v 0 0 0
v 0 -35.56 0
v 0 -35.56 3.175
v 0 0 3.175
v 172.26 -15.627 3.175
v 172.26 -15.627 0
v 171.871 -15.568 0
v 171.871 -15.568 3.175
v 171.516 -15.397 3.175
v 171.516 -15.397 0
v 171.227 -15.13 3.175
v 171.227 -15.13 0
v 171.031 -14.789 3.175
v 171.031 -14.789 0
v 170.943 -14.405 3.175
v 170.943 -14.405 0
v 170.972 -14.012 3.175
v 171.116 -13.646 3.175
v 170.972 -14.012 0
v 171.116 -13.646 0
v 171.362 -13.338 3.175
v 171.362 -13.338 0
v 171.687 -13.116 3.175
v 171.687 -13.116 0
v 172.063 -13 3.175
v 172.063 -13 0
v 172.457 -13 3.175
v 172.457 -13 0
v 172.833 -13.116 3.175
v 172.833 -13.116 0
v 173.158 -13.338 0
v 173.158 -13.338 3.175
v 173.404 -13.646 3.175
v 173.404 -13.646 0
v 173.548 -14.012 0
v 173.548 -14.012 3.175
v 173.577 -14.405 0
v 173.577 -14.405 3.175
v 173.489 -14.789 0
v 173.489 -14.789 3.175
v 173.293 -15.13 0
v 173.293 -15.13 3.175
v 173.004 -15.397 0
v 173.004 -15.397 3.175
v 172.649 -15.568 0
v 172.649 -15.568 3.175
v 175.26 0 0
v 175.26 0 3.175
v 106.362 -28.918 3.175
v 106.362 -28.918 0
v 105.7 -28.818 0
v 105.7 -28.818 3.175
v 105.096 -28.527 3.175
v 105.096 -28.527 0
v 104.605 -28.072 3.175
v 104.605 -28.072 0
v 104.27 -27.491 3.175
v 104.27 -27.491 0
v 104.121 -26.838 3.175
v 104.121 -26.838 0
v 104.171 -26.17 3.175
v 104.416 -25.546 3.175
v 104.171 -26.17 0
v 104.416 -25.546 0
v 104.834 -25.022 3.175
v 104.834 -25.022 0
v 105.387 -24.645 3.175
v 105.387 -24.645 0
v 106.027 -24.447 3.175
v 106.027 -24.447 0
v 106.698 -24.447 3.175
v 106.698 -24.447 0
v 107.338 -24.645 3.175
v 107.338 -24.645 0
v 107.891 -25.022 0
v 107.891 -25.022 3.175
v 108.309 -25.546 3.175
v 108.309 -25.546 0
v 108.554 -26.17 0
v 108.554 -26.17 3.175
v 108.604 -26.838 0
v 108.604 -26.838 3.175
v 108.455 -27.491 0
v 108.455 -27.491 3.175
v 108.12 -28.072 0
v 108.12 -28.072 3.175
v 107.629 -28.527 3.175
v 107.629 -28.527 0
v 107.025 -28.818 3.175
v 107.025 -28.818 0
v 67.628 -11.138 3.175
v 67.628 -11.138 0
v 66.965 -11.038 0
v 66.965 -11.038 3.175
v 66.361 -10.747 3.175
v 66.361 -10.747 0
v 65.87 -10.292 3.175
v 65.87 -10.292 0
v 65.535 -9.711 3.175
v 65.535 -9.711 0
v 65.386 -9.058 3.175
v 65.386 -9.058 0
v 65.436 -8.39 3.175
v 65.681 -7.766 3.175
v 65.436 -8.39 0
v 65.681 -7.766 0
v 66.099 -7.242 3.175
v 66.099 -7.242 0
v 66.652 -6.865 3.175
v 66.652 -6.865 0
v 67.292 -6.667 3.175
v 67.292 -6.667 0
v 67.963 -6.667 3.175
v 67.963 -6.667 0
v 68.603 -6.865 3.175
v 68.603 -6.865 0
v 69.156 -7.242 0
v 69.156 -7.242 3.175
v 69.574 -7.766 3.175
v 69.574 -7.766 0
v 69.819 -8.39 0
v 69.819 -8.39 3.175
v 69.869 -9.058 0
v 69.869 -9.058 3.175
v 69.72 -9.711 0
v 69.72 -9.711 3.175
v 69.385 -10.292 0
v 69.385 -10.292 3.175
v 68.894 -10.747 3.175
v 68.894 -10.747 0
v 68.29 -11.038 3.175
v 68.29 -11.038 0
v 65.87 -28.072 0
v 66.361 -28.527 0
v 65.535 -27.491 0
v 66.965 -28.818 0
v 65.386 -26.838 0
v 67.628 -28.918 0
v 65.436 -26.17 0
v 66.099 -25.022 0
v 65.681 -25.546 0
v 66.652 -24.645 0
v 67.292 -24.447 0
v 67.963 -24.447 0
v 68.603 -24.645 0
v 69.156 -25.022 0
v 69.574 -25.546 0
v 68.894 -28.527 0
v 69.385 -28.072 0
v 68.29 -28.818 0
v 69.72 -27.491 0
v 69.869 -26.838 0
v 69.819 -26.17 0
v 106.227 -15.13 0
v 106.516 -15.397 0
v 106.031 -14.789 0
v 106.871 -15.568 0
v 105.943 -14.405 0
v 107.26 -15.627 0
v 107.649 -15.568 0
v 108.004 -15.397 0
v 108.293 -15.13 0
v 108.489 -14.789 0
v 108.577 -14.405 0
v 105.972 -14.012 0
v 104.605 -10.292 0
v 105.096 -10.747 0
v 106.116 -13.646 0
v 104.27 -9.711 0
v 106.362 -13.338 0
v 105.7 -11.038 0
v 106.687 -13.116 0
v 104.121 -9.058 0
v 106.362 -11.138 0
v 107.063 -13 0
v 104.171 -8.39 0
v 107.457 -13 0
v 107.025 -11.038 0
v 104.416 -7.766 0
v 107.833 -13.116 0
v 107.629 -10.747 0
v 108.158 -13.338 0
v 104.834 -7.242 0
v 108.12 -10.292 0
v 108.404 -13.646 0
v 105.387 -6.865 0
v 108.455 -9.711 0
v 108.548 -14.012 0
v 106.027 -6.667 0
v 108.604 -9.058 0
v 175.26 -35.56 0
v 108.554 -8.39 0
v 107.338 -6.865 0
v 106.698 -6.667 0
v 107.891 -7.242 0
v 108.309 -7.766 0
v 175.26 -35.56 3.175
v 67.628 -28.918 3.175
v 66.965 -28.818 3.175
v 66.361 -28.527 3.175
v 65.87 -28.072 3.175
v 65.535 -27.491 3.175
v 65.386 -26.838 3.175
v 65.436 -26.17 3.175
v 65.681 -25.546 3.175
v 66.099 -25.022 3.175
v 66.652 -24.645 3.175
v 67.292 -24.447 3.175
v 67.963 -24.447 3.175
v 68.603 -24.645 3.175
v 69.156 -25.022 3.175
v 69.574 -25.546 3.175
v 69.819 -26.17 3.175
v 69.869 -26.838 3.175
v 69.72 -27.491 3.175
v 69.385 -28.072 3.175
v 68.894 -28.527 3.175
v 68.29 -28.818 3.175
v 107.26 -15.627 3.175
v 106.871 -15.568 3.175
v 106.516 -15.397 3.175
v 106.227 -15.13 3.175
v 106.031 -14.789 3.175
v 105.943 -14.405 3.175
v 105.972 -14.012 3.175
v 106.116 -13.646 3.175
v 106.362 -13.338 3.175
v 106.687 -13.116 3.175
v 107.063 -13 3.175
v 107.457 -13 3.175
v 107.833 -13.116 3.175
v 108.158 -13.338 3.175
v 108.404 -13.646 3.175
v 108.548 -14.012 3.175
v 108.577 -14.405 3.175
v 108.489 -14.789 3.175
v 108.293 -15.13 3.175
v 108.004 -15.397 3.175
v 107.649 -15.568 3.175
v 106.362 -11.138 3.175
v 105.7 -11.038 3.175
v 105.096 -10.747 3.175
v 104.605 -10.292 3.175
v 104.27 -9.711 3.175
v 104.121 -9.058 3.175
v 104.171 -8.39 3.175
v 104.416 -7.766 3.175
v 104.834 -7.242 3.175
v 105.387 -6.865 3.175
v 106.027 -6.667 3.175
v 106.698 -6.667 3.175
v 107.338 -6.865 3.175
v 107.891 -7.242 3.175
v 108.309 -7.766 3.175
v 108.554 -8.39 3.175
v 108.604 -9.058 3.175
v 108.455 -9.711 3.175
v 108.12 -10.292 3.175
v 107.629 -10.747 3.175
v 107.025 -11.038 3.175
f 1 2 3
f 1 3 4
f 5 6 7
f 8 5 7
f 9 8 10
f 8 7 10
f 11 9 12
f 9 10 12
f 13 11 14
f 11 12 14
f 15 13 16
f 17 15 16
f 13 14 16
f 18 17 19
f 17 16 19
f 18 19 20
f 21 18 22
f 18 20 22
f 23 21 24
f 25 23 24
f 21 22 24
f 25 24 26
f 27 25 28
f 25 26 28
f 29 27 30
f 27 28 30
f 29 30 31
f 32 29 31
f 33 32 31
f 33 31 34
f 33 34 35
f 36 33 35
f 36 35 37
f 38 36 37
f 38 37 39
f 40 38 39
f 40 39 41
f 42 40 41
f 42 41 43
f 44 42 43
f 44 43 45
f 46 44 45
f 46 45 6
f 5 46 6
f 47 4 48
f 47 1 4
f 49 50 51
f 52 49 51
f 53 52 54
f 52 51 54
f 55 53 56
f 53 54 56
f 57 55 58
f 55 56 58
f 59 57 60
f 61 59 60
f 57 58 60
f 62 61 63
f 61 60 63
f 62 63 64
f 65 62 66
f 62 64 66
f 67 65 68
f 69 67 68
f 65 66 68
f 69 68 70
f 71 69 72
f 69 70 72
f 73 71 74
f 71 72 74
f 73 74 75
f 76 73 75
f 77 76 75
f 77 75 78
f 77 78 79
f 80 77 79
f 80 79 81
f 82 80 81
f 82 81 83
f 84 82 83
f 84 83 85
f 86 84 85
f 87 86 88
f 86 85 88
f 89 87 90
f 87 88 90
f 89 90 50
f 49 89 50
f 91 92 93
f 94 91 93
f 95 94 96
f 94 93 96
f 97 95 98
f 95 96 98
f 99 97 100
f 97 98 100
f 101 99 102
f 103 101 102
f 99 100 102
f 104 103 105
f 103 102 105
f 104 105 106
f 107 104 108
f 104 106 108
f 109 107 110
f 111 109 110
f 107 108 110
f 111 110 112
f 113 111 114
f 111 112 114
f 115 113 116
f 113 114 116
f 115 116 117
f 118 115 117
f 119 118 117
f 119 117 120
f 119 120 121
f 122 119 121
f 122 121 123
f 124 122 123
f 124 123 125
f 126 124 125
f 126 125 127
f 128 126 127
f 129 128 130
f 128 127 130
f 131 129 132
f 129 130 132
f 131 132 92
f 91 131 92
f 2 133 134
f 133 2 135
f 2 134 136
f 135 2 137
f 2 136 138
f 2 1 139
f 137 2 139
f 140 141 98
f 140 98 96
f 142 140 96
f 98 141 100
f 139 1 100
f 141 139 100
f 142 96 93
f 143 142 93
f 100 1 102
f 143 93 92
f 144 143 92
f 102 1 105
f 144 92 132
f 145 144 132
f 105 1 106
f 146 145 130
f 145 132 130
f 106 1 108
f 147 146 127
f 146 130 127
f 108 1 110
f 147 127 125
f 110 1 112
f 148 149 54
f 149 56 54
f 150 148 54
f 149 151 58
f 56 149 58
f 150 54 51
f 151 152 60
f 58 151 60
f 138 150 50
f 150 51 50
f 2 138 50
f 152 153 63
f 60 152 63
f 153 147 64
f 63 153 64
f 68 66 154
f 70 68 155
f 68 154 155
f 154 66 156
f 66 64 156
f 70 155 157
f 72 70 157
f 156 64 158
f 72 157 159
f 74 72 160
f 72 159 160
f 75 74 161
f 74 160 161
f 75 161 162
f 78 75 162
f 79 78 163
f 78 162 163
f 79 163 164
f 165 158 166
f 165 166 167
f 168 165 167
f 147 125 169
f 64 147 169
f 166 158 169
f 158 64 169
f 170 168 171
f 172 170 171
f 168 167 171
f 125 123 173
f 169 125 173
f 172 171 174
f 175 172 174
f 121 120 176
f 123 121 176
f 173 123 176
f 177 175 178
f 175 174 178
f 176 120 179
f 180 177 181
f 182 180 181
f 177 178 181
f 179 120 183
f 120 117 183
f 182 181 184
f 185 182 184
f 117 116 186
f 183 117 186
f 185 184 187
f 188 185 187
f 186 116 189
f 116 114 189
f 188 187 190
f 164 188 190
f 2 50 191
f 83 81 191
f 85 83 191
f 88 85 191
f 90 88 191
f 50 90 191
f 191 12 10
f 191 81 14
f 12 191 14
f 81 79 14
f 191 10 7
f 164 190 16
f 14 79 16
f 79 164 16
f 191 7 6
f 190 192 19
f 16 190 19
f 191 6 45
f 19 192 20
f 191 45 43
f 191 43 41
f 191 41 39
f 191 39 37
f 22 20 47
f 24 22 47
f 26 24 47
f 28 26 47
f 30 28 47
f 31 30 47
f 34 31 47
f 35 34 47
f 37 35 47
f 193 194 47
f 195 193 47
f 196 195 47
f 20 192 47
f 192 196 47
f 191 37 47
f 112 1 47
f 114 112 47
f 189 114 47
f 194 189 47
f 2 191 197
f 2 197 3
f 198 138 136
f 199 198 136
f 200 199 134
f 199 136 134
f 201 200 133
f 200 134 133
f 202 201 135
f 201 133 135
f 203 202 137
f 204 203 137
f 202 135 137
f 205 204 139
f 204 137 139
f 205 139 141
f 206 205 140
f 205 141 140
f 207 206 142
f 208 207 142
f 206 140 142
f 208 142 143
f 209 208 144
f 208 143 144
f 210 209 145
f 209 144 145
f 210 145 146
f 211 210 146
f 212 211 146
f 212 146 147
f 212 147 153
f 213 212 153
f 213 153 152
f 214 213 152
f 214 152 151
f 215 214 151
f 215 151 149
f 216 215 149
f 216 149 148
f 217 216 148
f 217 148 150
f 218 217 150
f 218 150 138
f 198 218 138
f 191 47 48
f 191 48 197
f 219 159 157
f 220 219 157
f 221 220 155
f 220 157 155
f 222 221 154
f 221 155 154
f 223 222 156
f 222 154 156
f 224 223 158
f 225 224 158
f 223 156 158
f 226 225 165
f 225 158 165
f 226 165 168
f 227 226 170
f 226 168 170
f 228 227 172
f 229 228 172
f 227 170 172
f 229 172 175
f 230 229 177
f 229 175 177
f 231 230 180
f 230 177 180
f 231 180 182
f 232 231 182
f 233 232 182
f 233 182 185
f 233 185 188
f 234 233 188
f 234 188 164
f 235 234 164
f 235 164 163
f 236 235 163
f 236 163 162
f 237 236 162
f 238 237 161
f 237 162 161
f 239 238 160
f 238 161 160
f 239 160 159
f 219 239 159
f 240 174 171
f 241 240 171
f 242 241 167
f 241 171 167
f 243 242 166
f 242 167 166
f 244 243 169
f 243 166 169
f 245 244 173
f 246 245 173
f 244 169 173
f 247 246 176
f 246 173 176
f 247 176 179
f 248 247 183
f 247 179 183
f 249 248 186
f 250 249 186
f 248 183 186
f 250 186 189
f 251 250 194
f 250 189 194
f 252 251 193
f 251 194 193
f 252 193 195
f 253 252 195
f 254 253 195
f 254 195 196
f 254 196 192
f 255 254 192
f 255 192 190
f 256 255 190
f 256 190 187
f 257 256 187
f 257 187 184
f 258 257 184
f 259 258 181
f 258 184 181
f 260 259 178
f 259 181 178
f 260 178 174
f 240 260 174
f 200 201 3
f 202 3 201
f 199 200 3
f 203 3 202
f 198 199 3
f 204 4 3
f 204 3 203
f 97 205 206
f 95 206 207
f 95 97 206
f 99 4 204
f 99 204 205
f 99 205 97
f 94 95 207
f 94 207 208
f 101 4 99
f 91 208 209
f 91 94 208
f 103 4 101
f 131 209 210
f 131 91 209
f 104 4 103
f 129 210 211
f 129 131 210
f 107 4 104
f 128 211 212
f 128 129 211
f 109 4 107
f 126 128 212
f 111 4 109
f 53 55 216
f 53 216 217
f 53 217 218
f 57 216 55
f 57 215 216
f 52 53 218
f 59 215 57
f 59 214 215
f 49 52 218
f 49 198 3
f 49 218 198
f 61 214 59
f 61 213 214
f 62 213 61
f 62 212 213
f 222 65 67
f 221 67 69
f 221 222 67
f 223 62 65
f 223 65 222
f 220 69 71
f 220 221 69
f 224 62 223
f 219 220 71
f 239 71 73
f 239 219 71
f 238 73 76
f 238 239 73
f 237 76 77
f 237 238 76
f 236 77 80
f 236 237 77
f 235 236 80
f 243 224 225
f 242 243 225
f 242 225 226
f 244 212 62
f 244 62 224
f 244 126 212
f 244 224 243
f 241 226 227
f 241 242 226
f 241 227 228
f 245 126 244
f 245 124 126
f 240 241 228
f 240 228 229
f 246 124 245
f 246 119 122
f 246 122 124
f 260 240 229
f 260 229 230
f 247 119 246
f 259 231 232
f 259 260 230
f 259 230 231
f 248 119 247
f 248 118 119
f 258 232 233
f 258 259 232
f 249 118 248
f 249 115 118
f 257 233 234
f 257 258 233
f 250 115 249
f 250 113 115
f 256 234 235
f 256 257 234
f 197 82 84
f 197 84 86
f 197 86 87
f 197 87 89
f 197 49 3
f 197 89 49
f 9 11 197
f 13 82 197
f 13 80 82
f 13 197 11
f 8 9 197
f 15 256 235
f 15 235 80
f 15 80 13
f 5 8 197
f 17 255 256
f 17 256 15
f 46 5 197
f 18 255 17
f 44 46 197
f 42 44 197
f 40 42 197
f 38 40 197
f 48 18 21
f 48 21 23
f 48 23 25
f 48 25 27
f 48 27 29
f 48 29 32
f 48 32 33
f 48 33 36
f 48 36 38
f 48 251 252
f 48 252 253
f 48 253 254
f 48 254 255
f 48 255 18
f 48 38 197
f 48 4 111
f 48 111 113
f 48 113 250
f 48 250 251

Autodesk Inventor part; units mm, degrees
ref_plane "YZ Plane" through (0, 0, 0) normal (1, 0, 0) x (0, 1, 0)
ref_plane "XZ Plane" through (0, 0, 0) normal (0, 1, 0) x (-1, 0, 0)
ref_plane "XY Plane" through (0, 0, 0) normal (0, 0, 1) x (1, 0, 0)
sketch "Sketch1" plane through (0, 0, 0) normal (0, 0, 1) x (1, 0, 0)
  line L0 (0, 0) -> (175.26, 0)
  line L1 (175.26, 0) -> (175.26, -35.56)
  line L2 (175.26, -35.56) -> (0, -35.56)
  line L3 (0, -35.56) -> (0, 0)
  dimension "d0" = 175.26
  dimension "d1" = 35.56
extrude "Extrusion1" add sketch "Sketch1" along normal blind 3.175
sketch "Sketch7" plane through (0, 0, 3.175) normal (0, 0, 1) x (1, 0, 0)
  line L0 (0, 0) -> (175.26, 0) projected
  line L1 (175.26, -35.56) -> (0, -35.56) projected
  line L2 (111.125, 1.27) -> (111.125, -35.56)
  line L3 (111.125, 1.27) -> (101.6, 1.27)
  line L4 (101.6, -35.56) -> (101.6, 1.27)
  line L5 (111.125, -35.56) -> (101.6, -35.56)
  line L6 (62.865, 1.27) -> (62.865, -35.56)
  line L7 (62.865, -35.56) -> (72.39, -35.56)
  line L8 (72.39, -35.56) -> (72.39, 1.27)
  line L9 (62.865, 1.27) -> (72.39, 1.27)
  circle A0 centre (106.3625, -26.67) radius 1.651
  circle A1 centre (106.3625, -8.89) radius 1.651
  point P0 (67.6275, -8.89)
  point P1 (67.6275, -26.67)
  point P2 (106.3625, -8.89)
  point P3 (106.3625, -26.67)
  dimension "d97" = 26.67
  dimension "d98" = 8.89
  dimension "d99" = 8.89
  dimension "d100" = 26.67
  dimension "d101" = 8.89
hole "Hole5" at (67.6275, -8.89, 3.175) at (67.6275, -26.67, 3.175) at (106.3625, -8.89, 3.175) at (106.3625, -26.67, 3.175) direction (0, 0, -1) diameter 4.4958 end through all clearance for "Hex Machine Screw" size "#8" standard "Ansi Unified Screw Threads"
sketch "Sketch8" plane through (0, 0, 3.175) normal (0, 0, 1) x (1, 0, 0)
  arc A0 (172.26, -12.306) -> (172.26, -16.306) centre (172.26, -14.306) ccw projected
  arc A1 (107.26, -16.306) -> (107.26, -12.306) centre (107.26, -14.306) ccw projected
hole "Hole6" at (107.26, -14.306, 3.175) at (172.26, -14.306, 3.175) direction (0, 0, -1) diameter 2.6416 end through all thread size "6-32 UNC" class "2B" standard "ANSI Unified Screw Threads"
properties part number "Battery Board" material "Aluminum-6061"
